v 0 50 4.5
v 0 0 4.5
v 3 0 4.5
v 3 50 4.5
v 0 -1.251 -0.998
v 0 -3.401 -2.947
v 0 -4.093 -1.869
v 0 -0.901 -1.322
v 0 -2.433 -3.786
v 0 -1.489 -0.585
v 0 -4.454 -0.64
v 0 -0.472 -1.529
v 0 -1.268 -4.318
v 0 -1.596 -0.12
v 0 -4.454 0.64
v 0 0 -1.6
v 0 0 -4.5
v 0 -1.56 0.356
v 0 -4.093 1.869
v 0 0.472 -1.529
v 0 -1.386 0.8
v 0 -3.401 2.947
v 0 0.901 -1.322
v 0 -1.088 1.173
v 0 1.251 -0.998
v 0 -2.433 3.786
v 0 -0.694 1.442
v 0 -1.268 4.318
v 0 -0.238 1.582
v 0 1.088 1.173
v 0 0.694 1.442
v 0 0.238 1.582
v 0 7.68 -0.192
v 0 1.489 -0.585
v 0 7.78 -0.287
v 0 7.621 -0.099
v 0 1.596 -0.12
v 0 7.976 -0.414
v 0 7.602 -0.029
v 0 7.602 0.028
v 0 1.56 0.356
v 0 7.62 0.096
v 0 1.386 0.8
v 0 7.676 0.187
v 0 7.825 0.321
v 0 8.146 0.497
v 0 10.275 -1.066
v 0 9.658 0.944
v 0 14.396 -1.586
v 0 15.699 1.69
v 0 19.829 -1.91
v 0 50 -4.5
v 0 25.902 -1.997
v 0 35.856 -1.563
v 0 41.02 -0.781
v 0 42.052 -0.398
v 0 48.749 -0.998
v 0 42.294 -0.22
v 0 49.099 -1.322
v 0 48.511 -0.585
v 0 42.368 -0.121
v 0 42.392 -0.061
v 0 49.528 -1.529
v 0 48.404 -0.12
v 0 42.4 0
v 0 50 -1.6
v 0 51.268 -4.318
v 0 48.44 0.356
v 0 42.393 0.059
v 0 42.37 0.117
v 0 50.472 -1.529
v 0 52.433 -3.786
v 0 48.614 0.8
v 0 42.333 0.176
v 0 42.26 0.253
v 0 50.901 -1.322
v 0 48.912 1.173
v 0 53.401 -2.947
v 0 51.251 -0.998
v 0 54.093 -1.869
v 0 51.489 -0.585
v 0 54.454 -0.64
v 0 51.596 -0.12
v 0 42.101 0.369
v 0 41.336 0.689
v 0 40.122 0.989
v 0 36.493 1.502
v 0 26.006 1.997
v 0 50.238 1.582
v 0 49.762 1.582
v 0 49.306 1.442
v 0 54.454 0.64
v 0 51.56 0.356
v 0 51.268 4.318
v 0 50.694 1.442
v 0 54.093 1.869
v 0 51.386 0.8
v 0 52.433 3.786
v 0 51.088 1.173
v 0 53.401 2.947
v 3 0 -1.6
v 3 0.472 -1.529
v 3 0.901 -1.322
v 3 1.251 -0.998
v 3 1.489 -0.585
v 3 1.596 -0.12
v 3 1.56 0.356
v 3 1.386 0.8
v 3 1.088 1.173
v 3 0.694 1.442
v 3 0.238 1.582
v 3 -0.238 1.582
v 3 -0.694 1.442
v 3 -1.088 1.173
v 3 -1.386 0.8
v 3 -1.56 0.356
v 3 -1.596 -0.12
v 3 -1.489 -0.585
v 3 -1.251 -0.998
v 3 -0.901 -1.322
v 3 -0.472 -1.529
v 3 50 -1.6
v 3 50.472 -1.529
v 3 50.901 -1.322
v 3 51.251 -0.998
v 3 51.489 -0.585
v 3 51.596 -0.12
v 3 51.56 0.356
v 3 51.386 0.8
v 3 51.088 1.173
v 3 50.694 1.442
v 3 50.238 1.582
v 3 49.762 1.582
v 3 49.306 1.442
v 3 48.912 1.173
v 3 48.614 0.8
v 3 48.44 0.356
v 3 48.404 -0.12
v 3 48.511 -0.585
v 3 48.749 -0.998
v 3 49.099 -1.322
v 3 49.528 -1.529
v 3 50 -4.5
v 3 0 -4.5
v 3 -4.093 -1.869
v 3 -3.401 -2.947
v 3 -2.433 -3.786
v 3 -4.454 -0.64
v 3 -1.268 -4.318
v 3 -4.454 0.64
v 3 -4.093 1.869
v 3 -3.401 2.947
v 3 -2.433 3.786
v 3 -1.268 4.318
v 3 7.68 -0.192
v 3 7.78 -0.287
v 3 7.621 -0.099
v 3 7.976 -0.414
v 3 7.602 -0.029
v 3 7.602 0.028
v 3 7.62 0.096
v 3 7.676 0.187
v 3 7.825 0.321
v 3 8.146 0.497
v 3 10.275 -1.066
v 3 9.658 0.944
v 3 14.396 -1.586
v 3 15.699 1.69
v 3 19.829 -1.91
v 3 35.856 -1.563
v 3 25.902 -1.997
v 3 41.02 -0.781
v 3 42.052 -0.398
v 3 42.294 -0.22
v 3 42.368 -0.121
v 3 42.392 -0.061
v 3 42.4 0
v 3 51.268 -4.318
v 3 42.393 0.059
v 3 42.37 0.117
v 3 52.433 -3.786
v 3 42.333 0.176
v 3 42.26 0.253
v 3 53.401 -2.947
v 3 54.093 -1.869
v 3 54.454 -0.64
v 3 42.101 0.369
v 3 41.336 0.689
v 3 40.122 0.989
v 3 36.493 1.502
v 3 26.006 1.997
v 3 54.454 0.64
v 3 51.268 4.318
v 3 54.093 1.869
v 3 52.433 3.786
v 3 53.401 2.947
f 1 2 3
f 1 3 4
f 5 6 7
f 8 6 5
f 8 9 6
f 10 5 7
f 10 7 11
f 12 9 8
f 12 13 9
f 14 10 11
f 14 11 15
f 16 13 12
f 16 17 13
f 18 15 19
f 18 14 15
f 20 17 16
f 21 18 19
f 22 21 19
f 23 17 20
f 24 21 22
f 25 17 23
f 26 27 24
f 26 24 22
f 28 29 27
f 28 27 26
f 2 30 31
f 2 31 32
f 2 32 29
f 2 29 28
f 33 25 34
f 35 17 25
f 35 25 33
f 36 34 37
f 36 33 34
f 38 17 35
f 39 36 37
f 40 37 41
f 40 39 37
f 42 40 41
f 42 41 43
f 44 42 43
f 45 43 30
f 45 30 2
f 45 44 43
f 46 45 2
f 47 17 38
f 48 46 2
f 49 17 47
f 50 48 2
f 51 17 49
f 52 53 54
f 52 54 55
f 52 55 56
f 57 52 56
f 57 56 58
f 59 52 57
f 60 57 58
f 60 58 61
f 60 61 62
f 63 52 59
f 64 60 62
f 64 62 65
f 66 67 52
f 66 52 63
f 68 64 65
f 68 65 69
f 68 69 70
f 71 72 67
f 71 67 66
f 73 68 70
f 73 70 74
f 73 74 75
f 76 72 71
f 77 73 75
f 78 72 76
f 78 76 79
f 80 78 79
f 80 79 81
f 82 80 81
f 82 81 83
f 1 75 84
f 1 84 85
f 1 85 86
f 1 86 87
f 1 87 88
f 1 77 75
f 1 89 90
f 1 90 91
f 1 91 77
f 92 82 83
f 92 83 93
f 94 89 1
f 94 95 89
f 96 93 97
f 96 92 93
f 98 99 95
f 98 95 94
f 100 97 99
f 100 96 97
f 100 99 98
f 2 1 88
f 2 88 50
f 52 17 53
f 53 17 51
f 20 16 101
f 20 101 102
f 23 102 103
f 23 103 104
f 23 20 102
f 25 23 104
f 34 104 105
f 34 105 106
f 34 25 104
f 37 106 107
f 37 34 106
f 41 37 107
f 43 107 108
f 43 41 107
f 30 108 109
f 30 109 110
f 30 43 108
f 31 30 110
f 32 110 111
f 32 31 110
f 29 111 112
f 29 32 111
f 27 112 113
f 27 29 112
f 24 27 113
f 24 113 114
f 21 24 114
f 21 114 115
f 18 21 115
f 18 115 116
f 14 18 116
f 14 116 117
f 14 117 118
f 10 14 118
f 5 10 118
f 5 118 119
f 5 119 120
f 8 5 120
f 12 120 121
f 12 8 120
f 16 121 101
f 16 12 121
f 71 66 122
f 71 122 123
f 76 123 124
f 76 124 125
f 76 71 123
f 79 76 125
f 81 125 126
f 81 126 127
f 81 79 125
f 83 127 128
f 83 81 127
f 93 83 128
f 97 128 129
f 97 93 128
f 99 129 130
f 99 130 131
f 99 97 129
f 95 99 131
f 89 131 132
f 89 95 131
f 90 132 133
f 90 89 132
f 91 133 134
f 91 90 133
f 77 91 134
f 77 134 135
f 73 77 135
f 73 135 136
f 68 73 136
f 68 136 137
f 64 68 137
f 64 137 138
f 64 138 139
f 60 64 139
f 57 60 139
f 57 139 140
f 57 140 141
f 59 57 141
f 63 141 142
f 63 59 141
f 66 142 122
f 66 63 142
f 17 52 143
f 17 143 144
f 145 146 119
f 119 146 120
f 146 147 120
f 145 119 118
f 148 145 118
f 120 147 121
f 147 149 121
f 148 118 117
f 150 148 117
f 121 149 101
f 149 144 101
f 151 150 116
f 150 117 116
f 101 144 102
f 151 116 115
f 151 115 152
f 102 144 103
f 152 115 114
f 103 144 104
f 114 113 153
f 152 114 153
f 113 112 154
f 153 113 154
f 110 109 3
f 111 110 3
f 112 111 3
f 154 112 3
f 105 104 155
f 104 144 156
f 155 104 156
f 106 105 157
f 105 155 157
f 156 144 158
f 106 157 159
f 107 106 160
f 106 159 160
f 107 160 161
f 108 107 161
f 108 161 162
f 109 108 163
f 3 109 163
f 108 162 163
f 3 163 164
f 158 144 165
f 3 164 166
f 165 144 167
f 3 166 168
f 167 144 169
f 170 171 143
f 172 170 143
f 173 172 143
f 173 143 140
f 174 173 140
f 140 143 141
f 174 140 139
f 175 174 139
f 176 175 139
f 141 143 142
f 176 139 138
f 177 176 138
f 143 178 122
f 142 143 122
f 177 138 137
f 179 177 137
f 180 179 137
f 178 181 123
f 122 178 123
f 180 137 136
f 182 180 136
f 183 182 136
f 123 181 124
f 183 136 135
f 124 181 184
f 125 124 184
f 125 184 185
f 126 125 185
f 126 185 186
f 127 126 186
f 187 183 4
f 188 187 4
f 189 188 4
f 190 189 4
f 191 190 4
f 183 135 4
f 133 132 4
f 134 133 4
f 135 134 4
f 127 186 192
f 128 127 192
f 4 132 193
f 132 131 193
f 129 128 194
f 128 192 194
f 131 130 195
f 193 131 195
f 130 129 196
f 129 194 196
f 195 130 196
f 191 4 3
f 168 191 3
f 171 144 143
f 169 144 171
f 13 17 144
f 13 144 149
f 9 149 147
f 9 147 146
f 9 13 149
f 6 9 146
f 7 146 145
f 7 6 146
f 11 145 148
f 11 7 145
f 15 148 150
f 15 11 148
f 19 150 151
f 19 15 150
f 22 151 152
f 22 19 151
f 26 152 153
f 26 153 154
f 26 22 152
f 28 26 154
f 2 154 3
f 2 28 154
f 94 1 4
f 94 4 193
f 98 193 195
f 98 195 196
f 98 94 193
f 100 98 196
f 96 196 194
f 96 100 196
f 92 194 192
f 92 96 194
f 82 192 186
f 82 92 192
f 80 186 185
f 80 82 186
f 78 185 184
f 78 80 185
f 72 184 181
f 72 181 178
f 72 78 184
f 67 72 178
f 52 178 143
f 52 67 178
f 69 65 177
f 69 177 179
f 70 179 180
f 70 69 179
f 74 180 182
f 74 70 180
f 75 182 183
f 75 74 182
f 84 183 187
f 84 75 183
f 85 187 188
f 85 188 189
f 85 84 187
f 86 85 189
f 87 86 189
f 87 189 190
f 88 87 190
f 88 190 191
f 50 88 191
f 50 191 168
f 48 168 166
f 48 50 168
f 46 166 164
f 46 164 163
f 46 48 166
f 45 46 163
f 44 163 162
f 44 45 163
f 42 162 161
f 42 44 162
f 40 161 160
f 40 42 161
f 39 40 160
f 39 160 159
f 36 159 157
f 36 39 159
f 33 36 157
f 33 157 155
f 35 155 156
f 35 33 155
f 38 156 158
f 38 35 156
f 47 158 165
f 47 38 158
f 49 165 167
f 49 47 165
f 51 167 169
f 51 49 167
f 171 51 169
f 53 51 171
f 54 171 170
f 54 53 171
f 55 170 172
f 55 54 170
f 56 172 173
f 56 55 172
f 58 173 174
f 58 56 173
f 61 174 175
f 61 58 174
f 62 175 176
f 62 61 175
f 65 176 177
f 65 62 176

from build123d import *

# Parameters (mm, degrees)
SKETCH1_R           = 1.6
SKETCH1_RX          = 17.4
SKETCH1_RY          = 2
BOSS_EXTRUDE1_DEPTH = 3


with BuildPart() as part:
    # Sketch1 → Boss-Extrude1 (new body)
    with BuildSketch(Plane(origin=(0, 0, 0), x_dir=(0, 0, -1), z_dir=(1, 0, 0))):
        with BuildLine():
            Line((-4.5, 0), (-4.5, 50))
            ThreePointArc((-4.5, 50), (0, 54.5), (4.5, 50))
            Line((4.5, 50), (4.5, 0))
            ThreePointArc((4.5, 0), (0, -4.5), (-4.5, 0))
        make_face()
        with Locations((0, 50)):
            Circle(SKETCH1_R, mode=Mode.SUBTRACT)
        Circle(SKETCH1_R, mode=Mode.SUBTRACT)
        with Locations(Location((0, 25), (0, 0, 90))):
            Ellipse(SKETCH1_RX, SKETCH1_RY, mode=Mode.SUBTRACT)
    extrude(amount=BOSS_EXTRUDE1_DEPTH)


solid = part.part
